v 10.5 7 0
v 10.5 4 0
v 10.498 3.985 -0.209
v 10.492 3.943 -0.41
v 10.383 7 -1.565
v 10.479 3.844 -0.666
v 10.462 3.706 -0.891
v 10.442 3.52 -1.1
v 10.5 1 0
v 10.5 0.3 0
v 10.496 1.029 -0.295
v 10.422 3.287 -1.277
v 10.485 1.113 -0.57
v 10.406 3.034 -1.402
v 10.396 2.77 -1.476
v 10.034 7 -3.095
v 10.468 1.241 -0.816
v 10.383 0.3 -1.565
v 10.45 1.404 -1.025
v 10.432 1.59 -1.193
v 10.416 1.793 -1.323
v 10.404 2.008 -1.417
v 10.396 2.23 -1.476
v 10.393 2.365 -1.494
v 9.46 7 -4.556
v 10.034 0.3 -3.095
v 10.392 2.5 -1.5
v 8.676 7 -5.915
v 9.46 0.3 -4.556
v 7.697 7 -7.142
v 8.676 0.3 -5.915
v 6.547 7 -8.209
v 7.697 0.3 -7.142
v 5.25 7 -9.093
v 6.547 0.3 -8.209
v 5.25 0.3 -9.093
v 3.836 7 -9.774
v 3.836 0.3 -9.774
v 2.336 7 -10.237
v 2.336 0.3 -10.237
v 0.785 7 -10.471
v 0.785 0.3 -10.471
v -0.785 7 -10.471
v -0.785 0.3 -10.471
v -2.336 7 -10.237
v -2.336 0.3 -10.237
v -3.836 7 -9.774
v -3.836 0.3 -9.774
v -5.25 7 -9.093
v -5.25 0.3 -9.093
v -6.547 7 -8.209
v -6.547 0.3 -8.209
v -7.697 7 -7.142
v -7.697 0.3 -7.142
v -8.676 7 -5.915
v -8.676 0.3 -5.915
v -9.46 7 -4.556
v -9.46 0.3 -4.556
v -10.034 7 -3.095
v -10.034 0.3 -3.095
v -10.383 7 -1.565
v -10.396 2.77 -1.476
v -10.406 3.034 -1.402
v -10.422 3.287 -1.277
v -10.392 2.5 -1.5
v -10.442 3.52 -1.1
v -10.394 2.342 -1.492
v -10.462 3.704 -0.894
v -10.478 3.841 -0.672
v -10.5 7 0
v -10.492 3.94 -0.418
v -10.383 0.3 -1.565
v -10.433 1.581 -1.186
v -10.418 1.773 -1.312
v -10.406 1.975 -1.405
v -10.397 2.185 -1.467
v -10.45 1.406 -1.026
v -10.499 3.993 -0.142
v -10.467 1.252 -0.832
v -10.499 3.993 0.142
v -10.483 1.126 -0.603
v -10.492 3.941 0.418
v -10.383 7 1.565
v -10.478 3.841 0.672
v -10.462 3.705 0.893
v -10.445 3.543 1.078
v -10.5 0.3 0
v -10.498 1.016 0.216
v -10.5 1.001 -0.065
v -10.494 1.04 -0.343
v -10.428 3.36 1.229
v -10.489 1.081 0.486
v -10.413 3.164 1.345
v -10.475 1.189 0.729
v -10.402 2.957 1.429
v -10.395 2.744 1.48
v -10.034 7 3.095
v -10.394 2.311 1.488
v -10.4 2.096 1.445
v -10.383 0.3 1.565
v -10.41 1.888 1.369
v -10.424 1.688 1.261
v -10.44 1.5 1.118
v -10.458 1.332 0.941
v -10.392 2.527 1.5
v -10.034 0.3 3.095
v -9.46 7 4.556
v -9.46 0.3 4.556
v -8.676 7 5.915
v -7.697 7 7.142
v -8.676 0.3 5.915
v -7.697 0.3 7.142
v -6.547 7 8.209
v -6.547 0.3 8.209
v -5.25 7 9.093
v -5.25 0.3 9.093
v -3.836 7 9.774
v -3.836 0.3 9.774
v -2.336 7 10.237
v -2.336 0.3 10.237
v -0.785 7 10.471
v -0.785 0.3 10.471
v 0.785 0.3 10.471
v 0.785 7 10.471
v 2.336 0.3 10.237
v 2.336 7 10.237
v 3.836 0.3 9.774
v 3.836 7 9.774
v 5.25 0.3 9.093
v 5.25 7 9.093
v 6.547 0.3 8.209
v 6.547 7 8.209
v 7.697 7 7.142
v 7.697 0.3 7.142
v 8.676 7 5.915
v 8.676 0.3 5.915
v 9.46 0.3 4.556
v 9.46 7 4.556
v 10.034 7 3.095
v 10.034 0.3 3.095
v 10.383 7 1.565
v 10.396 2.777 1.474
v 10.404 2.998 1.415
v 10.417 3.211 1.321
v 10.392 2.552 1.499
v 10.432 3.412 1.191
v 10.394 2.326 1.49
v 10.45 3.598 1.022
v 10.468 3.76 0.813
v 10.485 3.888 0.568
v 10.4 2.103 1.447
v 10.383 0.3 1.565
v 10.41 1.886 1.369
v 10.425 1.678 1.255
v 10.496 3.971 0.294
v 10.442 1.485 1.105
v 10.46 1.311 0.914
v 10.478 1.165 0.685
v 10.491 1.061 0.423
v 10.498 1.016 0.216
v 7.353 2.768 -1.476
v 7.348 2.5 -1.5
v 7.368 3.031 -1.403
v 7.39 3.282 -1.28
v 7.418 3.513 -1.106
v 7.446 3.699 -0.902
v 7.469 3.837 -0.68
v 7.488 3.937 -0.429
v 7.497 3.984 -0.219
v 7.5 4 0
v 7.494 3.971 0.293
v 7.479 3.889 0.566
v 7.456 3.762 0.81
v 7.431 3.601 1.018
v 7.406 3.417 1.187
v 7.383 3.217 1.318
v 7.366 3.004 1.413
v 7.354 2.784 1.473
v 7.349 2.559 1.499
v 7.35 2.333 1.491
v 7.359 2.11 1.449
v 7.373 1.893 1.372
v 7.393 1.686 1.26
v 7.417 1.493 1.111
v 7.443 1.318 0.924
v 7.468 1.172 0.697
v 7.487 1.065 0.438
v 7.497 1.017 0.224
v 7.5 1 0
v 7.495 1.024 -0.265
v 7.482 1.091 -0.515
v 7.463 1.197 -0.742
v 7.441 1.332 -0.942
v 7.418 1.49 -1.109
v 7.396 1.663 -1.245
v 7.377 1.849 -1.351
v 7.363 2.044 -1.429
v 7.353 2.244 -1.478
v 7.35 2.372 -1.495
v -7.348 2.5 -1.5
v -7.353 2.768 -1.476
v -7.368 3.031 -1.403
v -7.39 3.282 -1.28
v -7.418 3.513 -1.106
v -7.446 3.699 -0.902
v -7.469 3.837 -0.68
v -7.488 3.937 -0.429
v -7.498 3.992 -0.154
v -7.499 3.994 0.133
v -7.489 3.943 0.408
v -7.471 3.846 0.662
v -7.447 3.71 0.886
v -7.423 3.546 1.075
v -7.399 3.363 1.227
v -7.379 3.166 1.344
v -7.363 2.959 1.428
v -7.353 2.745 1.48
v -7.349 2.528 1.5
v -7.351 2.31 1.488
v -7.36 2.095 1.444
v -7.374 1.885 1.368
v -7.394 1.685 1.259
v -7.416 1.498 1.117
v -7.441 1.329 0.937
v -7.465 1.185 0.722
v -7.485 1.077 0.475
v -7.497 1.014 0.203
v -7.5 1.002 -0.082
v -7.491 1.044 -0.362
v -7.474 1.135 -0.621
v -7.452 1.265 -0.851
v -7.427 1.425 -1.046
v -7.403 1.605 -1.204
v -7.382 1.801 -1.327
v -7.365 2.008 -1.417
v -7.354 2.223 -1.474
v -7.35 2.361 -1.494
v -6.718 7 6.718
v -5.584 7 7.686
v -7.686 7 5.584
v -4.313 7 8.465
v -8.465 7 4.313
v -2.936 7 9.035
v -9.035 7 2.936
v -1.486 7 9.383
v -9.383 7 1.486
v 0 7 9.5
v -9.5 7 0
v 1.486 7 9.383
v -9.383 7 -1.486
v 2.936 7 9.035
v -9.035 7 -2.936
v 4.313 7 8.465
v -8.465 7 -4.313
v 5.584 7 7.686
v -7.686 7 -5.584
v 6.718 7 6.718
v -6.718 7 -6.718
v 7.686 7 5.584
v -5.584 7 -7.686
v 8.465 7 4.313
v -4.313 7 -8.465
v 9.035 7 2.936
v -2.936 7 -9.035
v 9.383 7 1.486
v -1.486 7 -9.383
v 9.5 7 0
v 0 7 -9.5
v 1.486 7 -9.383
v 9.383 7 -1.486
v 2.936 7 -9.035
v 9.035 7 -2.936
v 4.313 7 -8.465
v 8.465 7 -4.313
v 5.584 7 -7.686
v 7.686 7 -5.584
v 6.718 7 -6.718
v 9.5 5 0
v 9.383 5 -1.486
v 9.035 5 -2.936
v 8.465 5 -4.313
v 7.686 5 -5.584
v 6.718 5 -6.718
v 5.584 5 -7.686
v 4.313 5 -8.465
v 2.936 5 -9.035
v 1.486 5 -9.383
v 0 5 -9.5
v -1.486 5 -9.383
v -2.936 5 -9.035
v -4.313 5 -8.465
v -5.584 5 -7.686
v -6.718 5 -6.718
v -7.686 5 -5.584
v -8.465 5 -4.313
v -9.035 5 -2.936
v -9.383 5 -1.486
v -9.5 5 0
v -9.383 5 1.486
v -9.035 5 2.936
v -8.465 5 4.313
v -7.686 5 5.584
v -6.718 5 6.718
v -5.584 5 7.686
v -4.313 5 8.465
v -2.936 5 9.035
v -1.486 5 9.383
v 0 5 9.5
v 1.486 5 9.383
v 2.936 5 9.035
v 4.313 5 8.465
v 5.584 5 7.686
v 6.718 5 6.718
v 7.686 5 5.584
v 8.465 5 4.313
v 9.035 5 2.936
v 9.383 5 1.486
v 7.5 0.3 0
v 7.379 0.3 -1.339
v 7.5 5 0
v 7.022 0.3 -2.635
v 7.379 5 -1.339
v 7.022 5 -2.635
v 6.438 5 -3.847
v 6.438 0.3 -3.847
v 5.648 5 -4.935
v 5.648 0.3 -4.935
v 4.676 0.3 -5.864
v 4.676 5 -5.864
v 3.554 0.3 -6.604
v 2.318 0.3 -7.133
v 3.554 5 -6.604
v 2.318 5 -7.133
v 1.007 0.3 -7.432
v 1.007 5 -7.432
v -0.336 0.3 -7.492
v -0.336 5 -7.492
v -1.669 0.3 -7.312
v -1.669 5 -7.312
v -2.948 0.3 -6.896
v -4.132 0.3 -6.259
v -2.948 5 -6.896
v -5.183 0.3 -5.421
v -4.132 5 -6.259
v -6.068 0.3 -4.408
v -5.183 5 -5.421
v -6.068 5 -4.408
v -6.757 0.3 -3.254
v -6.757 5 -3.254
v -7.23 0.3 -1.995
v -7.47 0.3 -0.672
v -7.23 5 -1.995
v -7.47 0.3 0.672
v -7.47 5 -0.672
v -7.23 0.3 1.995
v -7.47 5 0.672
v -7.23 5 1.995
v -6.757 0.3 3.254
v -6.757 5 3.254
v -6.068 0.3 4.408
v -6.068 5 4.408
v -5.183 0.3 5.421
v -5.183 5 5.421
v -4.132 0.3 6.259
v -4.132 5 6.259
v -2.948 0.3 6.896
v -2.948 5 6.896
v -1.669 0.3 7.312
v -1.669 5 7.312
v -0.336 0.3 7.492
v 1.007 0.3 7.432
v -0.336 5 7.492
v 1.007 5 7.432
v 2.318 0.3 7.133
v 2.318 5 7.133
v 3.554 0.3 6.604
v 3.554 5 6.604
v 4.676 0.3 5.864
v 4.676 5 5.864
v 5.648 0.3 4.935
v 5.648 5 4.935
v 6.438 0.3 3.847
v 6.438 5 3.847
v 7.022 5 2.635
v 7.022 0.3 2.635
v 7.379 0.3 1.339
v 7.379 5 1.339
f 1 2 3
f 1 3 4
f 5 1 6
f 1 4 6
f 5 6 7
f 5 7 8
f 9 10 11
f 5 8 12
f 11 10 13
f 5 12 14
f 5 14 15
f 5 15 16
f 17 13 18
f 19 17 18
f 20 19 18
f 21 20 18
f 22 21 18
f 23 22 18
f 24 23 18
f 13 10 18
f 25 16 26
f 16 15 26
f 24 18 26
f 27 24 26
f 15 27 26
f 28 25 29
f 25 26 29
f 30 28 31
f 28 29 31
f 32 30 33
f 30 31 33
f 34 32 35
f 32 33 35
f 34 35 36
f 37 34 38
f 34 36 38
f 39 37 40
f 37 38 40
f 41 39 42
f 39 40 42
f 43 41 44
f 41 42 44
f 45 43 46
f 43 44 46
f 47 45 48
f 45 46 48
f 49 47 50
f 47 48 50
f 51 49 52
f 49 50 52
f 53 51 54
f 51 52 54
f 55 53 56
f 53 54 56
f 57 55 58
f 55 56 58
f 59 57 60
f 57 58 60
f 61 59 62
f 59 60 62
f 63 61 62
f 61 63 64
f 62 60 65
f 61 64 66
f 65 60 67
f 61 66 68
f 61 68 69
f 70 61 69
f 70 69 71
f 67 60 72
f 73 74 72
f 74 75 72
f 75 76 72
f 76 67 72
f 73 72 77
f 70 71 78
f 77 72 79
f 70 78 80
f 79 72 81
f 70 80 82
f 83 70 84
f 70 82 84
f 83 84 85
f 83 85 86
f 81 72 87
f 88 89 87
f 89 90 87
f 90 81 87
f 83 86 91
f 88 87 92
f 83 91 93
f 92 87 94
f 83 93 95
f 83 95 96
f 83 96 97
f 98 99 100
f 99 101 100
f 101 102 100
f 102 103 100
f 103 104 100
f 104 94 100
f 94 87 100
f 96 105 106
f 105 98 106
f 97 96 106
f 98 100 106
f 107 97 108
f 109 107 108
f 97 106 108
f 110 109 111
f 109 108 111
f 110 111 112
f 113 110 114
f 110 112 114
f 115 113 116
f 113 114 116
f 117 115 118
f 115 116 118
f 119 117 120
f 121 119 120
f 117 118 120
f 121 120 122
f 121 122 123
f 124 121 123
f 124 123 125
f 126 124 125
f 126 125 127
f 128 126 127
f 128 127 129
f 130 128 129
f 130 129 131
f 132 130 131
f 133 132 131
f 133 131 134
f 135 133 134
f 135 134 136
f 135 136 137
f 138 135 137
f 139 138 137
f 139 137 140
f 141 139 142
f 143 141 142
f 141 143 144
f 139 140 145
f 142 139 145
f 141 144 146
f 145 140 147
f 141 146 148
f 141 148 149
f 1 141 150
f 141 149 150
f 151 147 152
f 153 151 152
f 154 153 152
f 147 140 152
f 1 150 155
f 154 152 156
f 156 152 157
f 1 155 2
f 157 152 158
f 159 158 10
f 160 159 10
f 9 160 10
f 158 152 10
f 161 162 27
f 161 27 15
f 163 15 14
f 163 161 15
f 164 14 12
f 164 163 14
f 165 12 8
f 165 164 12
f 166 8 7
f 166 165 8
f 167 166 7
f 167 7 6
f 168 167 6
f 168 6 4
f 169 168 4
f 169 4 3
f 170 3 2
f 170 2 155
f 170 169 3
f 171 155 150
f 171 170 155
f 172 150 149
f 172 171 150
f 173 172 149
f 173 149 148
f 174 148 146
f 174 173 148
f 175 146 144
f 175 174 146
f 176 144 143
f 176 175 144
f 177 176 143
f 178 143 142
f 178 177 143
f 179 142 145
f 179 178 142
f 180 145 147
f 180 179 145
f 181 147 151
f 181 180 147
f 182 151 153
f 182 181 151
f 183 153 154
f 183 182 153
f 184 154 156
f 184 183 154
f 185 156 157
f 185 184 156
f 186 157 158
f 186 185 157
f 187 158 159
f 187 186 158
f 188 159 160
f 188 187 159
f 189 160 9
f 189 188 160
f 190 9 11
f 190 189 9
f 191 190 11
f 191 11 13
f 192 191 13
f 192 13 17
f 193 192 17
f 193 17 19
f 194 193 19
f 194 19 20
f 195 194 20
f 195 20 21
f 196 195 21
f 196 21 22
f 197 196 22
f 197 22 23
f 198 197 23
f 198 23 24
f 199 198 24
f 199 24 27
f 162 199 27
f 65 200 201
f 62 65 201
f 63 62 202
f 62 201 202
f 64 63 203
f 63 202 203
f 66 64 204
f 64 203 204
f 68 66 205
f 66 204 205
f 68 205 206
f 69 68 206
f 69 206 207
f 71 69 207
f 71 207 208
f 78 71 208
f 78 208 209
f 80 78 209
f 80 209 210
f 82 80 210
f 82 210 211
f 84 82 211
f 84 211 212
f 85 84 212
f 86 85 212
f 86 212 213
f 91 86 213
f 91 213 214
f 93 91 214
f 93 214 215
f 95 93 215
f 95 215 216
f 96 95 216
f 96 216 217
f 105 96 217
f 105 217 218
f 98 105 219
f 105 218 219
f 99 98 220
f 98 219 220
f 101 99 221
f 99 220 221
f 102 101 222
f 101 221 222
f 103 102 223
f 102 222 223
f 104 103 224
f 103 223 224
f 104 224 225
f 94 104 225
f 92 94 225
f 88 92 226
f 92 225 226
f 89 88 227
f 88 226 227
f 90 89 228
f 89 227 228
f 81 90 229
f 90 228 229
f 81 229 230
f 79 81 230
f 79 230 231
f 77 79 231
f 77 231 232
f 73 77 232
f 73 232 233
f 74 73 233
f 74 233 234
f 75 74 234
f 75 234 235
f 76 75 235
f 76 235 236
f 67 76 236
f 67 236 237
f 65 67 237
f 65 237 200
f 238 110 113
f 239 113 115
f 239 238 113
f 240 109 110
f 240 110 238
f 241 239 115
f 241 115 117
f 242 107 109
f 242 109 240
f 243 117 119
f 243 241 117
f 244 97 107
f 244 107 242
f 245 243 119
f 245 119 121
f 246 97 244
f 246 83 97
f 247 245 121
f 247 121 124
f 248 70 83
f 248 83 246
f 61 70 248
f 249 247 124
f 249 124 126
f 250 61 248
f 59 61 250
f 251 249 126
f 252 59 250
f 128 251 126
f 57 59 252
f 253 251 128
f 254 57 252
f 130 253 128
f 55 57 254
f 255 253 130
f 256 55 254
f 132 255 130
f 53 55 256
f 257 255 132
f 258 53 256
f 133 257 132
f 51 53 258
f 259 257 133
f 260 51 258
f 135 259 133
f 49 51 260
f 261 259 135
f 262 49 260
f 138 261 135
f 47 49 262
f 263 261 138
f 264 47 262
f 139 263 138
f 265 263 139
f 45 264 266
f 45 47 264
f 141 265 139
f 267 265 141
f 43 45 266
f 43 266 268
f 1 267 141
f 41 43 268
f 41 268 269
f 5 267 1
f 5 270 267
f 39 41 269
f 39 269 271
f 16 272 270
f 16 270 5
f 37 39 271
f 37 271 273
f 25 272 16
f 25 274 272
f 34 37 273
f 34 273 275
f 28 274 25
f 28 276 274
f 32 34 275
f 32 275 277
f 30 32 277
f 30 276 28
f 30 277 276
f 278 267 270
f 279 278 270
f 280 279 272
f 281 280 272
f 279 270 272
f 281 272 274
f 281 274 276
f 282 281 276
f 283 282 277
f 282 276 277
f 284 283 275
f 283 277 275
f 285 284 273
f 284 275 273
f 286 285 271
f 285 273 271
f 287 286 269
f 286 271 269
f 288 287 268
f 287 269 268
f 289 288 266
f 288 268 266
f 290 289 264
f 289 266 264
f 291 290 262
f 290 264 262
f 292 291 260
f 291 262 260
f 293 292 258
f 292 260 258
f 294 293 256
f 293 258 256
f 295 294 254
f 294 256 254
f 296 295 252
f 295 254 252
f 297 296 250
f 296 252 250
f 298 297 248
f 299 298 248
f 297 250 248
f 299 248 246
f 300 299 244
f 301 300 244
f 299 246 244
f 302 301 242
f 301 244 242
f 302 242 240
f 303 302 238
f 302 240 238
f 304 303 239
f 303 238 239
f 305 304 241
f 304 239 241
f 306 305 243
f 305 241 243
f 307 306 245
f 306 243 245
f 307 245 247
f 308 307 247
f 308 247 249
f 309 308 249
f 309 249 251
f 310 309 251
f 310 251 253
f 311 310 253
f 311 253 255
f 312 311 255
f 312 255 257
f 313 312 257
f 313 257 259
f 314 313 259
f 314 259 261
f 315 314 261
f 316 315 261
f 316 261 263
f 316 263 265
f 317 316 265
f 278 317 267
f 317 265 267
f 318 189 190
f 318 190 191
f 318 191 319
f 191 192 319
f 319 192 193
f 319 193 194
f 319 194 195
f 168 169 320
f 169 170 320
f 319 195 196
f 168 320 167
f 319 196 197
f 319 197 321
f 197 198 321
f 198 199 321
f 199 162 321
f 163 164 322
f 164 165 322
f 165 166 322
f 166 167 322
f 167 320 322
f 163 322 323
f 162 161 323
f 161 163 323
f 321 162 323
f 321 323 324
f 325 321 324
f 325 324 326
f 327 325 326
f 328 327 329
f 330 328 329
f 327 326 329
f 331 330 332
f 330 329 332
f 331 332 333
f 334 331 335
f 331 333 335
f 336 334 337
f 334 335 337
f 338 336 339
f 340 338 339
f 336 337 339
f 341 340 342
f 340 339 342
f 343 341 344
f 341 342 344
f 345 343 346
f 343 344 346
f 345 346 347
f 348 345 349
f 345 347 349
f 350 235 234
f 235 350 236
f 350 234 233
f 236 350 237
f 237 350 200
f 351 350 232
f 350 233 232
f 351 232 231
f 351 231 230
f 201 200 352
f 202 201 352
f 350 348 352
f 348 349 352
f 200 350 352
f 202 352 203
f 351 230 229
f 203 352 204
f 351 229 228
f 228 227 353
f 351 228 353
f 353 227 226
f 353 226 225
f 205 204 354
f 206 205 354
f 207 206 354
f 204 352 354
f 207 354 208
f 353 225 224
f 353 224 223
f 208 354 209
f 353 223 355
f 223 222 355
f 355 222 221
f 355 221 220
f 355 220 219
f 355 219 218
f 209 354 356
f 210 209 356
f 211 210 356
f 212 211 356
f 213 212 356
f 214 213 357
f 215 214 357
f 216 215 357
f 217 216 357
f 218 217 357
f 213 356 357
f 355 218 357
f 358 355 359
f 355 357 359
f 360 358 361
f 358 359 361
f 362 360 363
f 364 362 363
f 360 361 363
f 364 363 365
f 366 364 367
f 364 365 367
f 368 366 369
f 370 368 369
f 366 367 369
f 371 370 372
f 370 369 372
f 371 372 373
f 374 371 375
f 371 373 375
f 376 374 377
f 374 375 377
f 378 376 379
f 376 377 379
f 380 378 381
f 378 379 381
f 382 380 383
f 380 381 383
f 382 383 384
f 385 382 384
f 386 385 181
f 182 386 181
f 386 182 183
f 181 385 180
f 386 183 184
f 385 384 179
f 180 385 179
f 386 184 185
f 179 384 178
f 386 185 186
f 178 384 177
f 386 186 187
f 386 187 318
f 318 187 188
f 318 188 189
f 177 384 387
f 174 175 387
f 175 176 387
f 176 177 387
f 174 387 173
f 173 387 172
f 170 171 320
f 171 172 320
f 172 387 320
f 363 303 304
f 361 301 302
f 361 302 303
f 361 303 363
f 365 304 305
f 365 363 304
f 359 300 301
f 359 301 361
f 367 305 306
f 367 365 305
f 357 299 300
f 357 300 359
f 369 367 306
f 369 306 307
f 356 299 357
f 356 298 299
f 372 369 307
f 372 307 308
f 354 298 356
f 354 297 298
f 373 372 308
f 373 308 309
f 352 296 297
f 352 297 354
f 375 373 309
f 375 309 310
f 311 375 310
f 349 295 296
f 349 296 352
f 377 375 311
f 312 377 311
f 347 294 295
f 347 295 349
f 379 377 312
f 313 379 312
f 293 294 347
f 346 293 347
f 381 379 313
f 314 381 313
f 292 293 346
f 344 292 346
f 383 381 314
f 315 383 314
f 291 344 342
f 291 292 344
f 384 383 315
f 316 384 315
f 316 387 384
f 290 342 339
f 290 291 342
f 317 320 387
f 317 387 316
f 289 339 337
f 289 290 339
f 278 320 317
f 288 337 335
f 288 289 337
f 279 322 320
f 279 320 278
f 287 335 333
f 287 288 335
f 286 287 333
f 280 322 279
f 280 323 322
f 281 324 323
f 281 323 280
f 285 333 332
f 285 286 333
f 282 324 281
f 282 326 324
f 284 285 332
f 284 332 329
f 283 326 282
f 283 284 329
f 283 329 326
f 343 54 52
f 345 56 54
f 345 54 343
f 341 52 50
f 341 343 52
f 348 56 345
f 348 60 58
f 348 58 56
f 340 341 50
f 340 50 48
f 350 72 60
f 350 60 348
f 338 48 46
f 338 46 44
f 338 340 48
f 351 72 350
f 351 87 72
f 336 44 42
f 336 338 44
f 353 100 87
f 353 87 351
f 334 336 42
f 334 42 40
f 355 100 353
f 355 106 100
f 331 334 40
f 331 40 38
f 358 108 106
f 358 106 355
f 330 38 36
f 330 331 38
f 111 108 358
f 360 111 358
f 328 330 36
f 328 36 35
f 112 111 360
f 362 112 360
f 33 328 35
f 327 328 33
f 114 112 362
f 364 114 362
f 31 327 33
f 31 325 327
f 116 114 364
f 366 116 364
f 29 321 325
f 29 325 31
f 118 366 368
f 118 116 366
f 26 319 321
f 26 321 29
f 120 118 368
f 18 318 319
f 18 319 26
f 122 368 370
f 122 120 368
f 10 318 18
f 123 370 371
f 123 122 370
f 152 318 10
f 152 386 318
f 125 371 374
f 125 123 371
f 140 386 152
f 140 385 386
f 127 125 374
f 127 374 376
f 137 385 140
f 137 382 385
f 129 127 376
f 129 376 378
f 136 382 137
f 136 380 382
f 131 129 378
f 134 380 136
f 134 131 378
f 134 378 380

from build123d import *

# Parameters (mm, degrees)
SCHIZZO1_R                    = 10.5
ESTRUSIONE_ESTRUSIONE1_DEPTH  = 7
SCHIZZO2_R                    = 9.5
TAGLIO_ESTRUSIONE1_DEPTH      = 2
SCHIZZO3_R                    = 7.5
TAGLIO_ESTRUSIONE2_DEPTH      = 6
SCHIZZO4_R                    = 1.5
TAGLIO_ESTRUSIONE3_DEPTH      = 11.5
TAGLIO_ESTRUSIONE3_DEPTH_BACK = 11.5
SCHIZZO6_R                    = 10.5
TAGLIO_ESTRUSIONE4_DEPTH      = 0.3


with BuildPart() as part:
    # Schizzo1 → Estrusione-Estrusione1 (new body)
    with BuildSketch(Plane(origin=(0, 0, 0), x_dir=(1, 0, 0), z_dir=(0, 1, 0))):
        Circle(SCHIZZO1_R)
    extrude(amount=ESTRUSIONE_ESTRUSIONE1_DEPTH)

    # Schizzo2 → Taglio-Estrusione1 (cut)
    with BuildSketch(Plane(origin=(0, 7, 0), x_dir=(1, 0, 0), z_dir=(0, 1, 0))):
        Circle(SCHIZZO2_R)
    extrude(amount=-TAGLIO_ESTRUSIONE1_DEPTH, mode=Mode.SUBTRACT)

    # Schizzo3 → Taglio-Estrusione2 (cut, through all)
    with BuildSketch(Plane(origin=(0, 5, 0), x_dir=(1, 0, 0), z_dir=(0, 1, 0))):
        Circle(SCHIZZO3_R)
    extrude(amount=-TAGLIO_ESTRUSIONE2_DEPTH, mode=Mode.SUBTRACT)

    # Schizzo4 → Taglio-Estrusione3 (cut, two sides)
    with BuildSketch(Plane(origin=(0, 0, 0), x_dir=(0, 0, -1), z_dir=(1, 0, 0))) as taglio_estrusione3_sk:
        with Locations((0, 2.5)):
            Circle(SCHIZZO4_R)
    extrude(amount=TAGLIO_ESTRUSIONE3_DEPTH, mode=Mode.SUBTRACT)
    extrude(taglio_estrusione3_sk.sketch, amount=-TAGLIO_ESTRUSIONE3_DEPTH_BACK, mode=Mode.SUBTRACT)

    # Schizzo6 → Taglio-Estrusione4 (cut)
    with BuildSketch(Plane.XZ):
        Circle(SCHIZZO6_R)
    extrude(amount=-TAGLIO_ESTRUSIONE4_DEPTH, mode=Mode.SUBTRACT)


solid = part.part
